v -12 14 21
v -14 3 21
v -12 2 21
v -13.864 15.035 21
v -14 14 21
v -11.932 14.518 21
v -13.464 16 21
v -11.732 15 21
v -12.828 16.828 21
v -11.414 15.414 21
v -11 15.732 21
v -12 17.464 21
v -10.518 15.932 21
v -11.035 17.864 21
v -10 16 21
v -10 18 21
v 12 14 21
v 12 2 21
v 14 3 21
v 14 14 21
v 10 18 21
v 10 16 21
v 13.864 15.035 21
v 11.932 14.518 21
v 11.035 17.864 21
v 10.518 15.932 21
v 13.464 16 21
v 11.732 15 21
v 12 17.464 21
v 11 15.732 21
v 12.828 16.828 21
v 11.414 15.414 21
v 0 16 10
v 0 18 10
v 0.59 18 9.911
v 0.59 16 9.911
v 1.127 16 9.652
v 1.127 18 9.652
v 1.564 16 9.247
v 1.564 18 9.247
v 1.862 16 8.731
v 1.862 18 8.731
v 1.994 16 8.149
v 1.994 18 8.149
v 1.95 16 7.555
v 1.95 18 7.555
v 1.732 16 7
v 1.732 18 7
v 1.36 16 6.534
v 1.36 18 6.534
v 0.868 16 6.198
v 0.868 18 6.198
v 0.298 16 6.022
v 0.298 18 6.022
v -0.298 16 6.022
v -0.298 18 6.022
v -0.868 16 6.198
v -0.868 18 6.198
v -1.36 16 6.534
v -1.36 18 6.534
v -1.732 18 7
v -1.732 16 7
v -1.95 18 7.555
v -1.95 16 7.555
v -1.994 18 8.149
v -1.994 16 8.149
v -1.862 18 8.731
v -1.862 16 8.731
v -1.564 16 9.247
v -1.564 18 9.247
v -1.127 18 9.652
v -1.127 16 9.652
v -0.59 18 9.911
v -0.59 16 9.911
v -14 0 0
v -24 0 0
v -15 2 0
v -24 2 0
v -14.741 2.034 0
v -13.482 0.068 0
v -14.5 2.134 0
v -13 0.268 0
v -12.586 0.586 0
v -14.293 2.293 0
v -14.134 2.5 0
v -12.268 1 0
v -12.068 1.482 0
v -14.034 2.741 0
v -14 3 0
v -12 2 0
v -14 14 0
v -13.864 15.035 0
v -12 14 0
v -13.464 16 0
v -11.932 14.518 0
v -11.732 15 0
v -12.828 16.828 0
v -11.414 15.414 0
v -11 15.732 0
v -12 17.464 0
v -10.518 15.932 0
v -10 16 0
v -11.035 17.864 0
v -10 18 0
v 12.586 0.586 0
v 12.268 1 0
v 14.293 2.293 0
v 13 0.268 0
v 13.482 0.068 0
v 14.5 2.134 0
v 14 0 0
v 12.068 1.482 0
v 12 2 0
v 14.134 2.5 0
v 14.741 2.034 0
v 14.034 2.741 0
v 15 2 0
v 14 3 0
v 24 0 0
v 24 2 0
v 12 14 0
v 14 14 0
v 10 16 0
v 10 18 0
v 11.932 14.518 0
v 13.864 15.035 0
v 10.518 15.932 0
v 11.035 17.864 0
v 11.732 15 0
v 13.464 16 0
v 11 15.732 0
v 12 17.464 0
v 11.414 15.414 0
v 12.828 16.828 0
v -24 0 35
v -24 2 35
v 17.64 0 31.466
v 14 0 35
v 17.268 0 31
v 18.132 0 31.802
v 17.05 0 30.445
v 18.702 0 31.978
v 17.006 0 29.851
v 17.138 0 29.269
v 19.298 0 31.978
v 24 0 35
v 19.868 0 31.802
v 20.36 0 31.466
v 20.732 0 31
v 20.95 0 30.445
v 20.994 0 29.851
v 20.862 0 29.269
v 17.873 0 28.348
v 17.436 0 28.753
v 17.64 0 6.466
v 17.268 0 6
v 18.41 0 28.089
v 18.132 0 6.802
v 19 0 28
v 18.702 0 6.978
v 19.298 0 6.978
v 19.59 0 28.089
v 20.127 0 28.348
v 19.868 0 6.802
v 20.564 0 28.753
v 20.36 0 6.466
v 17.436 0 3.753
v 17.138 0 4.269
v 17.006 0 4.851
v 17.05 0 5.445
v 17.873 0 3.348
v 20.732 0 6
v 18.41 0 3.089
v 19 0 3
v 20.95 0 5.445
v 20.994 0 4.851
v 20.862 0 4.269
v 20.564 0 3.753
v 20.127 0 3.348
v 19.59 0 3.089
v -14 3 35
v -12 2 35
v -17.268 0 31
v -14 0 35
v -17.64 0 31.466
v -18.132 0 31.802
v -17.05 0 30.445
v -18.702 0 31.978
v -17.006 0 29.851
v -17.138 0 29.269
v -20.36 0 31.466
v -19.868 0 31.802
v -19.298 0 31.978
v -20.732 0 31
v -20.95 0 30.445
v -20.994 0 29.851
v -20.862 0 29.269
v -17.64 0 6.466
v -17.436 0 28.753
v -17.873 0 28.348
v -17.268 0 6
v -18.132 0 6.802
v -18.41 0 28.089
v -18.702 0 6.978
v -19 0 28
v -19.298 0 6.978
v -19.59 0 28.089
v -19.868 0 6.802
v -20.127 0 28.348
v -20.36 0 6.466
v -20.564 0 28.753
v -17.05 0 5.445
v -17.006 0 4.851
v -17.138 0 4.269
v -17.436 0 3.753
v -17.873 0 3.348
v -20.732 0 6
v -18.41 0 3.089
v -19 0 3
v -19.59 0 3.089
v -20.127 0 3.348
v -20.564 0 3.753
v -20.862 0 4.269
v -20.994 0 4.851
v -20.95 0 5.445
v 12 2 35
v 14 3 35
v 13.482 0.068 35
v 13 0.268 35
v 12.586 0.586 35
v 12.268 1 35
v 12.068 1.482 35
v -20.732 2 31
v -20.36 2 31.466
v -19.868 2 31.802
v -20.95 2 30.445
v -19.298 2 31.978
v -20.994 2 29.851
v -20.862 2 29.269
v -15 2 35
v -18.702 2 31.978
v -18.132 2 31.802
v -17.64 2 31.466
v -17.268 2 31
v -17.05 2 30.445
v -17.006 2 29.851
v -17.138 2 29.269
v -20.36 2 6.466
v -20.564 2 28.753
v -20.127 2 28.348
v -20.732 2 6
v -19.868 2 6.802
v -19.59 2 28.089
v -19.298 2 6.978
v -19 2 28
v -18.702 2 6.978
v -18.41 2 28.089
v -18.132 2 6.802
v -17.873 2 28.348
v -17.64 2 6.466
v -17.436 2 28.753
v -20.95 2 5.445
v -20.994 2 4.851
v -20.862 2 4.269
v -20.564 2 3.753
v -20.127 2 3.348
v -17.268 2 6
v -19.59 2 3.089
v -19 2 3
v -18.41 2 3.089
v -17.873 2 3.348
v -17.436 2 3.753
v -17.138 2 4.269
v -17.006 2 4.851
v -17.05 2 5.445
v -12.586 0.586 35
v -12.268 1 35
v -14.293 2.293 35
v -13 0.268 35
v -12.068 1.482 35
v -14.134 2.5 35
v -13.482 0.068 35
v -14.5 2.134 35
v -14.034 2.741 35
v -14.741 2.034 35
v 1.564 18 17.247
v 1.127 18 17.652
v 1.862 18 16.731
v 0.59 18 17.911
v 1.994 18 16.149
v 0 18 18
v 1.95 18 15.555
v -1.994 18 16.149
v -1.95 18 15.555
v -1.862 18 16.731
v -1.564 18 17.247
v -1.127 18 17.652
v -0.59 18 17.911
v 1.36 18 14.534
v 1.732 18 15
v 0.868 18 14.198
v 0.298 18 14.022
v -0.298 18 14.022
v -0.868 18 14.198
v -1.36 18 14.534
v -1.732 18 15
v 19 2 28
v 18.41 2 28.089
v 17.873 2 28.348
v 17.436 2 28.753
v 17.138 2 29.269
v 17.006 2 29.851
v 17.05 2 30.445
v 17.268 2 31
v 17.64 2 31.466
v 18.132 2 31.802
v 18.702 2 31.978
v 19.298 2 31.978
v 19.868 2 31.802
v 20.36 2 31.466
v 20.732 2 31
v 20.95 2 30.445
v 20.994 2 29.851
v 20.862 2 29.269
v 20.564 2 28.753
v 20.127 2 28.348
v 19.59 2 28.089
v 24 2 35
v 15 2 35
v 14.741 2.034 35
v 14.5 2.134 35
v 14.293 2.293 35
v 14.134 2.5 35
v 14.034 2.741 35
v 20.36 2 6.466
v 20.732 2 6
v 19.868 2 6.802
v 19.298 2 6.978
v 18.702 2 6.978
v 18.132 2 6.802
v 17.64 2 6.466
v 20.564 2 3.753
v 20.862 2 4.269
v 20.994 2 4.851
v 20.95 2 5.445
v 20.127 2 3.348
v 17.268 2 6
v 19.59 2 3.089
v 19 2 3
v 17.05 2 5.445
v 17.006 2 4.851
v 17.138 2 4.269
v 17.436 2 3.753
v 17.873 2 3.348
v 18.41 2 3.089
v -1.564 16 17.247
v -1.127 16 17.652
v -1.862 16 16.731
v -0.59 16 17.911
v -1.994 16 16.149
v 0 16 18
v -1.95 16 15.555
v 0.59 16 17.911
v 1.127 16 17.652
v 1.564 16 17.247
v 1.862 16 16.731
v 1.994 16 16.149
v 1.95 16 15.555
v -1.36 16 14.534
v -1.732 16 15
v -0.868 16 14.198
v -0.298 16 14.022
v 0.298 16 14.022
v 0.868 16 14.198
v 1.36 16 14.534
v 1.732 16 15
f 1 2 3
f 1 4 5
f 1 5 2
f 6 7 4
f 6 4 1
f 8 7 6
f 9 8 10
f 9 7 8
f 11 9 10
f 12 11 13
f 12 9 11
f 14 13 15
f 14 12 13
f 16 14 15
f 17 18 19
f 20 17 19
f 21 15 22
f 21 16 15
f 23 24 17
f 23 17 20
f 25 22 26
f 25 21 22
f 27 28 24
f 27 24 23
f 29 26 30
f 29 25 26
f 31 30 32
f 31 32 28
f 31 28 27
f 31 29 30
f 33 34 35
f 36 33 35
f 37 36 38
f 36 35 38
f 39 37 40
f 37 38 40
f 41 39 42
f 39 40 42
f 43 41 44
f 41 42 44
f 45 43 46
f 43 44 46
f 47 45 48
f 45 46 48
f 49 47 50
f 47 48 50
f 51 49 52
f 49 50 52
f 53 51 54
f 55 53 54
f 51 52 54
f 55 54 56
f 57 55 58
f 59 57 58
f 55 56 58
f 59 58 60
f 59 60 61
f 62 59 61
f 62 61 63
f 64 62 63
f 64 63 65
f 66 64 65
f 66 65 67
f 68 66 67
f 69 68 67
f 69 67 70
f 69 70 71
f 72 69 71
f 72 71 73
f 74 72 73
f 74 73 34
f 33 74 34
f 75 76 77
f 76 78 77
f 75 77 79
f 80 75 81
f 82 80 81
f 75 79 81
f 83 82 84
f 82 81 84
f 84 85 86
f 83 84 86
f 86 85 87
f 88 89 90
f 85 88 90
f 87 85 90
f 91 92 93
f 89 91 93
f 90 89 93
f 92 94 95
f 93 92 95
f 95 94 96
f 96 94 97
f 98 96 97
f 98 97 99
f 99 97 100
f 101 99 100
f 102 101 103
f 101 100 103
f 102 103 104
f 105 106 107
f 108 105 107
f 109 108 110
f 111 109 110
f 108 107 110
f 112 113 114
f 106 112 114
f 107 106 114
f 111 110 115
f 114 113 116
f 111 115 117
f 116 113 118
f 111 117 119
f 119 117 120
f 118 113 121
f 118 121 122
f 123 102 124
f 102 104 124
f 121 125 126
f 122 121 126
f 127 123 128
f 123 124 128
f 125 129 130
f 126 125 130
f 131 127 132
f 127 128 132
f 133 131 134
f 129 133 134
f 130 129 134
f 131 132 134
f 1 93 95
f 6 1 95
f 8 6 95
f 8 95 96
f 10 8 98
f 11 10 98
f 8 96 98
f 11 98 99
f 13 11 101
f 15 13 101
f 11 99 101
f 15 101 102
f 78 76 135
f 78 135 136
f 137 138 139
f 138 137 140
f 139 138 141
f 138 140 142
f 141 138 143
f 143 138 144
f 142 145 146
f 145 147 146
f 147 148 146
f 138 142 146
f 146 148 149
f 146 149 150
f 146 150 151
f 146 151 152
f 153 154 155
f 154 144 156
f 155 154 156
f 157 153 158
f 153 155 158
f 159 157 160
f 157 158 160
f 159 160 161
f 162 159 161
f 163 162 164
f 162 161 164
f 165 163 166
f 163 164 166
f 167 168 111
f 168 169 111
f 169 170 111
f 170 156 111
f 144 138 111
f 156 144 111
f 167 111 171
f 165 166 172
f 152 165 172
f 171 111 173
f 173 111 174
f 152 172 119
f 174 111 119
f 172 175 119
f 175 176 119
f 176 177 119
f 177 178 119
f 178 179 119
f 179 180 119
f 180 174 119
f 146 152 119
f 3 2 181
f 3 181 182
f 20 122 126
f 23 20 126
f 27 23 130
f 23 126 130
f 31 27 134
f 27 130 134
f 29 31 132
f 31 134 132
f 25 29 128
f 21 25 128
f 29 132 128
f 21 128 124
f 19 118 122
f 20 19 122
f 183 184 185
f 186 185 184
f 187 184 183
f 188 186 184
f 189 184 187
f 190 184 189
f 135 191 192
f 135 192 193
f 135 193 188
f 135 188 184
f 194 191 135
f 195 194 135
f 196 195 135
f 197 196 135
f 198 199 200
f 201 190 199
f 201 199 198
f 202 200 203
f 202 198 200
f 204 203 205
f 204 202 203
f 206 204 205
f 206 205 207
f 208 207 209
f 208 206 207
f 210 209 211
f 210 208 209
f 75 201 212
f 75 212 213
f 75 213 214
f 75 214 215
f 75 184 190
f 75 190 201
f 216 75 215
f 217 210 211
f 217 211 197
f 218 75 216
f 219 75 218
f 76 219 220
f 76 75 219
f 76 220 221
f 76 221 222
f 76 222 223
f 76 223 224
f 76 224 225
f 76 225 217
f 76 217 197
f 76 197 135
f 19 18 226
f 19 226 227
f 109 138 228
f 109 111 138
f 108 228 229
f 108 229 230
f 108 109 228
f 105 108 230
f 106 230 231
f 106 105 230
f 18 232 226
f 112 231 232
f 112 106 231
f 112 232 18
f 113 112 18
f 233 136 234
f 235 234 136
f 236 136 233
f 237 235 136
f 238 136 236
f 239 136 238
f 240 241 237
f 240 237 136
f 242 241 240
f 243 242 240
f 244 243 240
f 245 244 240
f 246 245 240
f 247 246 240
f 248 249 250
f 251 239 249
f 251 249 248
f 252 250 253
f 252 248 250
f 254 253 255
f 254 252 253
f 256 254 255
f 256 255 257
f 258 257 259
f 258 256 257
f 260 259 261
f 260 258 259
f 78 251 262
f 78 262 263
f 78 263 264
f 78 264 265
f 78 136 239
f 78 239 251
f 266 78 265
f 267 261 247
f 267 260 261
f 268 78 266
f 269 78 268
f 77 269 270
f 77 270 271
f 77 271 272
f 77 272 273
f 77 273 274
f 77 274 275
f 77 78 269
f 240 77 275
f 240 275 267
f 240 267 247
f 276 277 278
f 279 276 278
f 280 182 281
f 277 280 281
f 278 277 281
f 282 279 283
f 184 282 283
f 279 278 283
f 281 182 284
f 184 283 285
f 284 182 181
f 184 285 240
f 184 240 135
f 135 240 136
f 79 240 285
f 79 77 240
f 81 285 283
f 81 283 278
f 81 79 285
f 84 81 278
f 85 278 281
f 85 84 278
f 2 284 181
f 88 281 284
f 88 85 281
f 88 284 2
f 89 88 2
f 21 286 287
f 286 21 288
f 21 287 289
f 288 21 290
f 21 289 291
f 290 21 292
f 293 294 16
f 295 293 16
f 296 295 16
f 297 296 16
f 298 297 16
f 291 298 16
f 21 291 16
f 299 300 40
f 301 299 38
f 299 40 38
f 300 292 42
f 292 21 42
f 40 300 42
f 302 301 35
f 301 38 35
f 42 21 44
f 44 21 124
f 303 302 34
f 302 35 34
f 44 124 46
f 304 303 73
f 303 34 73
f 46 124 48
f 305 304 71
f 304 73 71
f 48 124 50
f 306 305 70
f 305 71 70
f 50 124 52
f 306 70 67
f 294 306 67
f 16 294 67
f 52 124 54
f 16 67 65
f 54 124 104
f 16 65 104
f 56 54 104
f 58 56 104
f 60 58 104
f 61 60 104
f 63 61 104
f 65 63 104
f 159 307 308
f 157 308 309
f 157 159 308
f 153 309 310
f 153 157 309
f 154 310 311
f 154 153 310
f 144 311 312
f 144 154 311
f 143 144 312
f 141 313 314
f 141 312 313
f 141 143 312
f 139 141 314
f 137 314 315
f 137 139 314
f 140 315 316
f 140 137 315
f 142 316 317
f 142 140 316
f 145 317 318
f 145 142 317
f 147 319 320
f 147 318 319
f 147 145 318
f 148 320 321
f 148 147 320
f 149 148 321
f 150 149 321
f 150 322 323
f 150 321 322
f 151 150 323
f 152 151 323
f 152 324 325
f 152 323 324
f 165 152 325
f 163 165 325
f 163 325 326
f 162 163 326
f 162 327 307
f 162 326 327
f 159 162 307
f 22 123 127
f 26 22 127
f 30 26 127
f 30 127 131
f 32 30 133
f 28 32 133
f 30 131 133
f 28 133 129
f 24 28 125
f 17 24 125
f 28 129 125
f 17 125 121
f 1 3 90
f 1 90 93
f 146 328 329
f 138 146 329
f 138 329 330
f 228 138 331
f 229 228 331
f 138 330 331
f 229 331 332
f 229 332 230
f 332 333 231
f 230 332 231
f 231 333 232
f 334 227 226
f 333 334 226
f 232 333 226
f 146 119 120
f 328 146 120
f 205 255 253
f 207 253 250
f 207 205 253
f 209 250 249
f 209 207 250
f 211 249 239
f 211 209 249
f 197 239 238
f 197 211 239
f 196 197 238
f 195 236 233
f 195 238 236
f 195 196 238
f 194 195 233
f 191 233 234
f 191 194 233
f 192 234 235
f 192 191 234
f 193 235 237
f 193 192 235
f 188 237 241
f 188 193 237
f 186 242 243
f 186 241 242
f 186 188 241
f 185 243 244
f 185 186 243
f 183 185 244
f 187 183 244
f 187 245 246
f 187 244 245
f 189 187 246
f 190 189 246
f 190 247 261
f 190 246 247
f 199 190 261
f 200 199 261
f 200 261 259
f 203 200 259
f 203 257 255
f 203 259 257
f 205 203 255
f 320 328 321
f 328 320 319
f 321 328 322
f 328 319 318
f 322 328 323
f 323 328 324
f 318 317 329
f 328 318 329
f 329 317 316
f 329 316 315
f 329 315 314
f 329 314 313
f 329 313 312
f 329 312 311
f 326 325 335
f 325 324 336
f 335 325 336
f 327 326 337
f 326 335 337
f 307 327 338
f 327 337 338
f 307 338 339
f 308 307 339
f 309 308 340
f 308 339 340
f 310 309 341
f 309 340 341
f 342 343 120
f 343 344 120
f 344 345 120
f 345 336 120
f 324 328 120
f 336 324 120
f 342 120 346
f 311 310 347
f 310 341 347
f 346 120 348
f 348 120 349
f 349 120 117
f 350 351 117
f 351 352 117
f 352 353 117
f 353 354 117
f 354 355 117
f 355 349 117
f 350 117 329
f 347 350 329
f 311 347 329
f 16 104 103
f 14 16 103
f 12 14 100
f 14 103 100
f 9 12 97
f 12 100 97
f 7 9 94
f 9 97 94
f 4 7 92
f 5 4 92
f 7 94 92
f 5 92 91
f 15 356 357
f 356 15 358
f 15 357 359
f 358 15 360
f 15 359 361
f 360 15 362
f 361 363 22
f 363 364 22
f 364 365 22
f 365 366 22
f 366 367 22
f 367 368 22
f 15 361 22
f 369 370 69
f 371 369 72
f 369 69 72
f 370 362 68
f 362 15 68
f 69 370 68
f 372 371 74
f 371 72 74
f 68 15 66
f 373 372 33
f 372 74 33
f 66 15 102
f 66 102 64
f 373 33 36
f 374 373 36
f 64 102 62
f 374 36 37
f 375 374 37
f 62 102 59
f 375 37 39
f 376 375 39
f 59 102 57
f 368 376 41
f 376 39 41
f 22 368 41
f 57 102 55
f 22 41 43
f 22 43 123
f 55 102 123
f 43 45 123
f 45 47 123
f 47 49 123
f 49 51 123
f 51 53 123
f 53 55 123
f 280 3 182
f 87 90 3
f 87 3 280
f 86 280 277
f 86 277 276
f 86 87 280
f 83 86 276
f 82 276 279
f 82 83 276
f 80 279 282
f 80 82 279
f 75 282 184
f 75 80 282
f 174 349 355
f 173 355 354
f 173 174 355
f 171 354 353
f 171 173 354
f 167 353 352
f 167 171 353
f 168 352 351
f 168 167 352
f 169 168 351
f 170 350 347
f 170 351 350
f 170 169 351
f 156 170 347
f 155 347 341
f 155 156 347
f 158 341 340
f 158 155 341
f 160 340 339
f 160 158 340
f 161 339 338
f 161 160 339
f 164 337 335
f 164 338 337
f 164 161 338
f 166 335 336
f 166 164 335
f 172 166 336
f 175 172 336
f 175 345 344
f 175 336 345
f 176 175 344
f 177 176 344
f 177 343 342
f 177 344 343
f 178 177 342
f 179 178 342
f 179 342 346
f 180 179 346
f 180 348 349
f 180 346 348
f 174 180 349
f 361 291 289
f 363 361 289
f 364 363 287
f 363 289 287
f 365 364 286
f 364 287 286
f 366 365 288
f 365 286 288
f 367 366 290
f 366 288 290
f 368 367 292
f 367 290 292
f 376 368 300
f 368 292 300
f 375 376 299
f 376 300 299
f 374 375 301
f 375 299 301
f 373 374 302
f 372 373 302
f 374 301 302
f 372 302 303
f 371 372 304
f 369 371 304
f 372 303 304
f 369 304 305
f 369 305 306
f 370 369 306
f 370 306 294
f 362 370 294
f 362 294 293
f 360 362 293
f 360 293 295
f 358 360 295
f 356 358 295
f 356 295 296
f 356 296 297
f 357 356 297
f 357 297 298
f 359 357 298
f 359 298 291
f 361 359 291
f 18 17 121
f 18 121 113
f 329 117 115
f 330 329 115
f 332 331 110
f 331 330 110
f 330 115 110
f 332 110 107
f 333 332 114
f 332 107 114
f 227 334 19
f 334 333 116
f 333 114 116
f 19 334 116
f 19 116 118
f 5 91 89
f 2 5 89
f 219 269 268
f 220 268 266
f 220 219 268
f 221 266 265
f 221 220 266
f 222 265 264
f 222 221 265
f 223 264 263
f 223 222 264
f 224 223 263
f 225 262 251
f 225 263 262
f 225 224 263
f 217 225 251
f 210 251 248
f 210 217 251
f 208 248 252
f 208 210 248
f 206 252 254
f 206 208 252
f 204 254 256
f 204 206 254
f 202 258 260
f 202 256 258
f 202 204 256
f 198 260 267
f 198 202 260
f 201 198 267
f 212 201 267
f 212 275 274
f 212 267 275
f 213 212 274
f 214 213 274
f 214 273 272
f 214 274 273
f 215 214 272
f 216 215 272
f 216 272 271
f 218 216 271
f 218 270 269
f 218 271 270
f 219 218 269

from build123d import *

# Parameters (mm, degrees)
BOSS_EXTRUDE1_DEPTH = 21
BOSS_EXTRUDE2_DEPTH = 14
SKETCH6_R           = 2
CUT_EXTRUDE6_DEPTH  = 5
SKETCH7_R           = 2
CUT_EXTRUDE7_DEPTH  = 5


with BuildPart() as part:
    # Sketch2 → Boss-Extrude1 (new body)
    with BuildSketch(Plane.XY):
        with BuildLine():
            Line((-24, 0), (-14, 0))
            ThreePointArc((-14, 0), (-12.585786438, 0.585786438), (-12, 2))
            Line((-12, 2), (-12, 14))
            ThreePointArc((-12, 14), (-11.414213562, 15.414213562), (-10, 16))
            Line((-10, 16), (0, 16))
            Line((0, 16), (10, 16))
            ThreePointArc((10, 16), (11.414213562, 15.414213562), (12, 14))
            Line((12, 14), (12, 2))
            ThreePointArc((12, 2), (12.585786438, 0.585786438), (14, 0))
            Line((14, 0), (24, 0))
            Line((24, 0), (24, 2))
            Line((24, 2), (15, 2))
            ThreePointArc((15, 2), (14.292893219, 2.292893219), (14, 3))
            Line((14, 3), (14, 14))
            ThreePointArc((14, 14), (12.828427125, 16.828427125), (10, 18))
            Line((10, 18), (0, 18))
            Line((0, 18), (-10, 18))
            ThreePointArc((-10, 18), (-12.828427125, 16.828427125), (-14, 14))
            Line((-14, 14), (-14, 3))
            ThreePointArc((-14, 3), (-14.292893219, 2.292893219), (-15, 2))
            Line((-15, 2), (-24, 2))
            Line((-24, 2), (-24, 0))
        make_face()
    extrude(amount=BOSS_EXTRUDE1_DEPTH)

    # Sketch3 → Boss-Extrude2 (add)
    with BuildSketch(Plane.XY.offset(21)):
        with BuildLine():
            Line((-14, 3), (-12, 2))
            ThreePointArc((-12, 2), (-12.585786438, 0.585786438), (-14, 0))
            Line((-14, 0), (-24, 0))
            Line((-24, 0), (-24, 2))
            Line((-24, 2), (-15, 2))
            ThreePointArc((-15, 2), (-14.292893219, 2.292893219), (-14, 3))
        make_face()
        with BuildLine():
            Line((12, 2), (14, 3))
            ThreePointArc((14, 3), (14.292893219, 2.292893219), (15, 2))
            Line((15, 2), (24, 2))
            Line((24, 2), (24, 0))
            Line((24, 0), (14, 0))
            ThreePointArc((14, 0), (12.585786438, 0.585786438), (12, 2))
        make_face()
    extrude(amount=BOSS_EXTRUDE2_DEPTH)

    # Sketch6 → Cut-Extrude6 (cut)
    with BuildSketch(Plane(origin=(0, 0, 0), x_dir=(1, 0, 0), z_dir=(0, 1, 0))):
        with Locations(Location((-19, -5, 0), (0, 0, 90))):
            Circle(SKETCH6_R)
        with Locations(Location((-19, -30, 0), (0, 0, 90))):
            Circle(SKETCH6_R)
        with Locations(Location((19, -30, 0), (0, 0, 90))):
            Circle(SKETCH6_R)
        with Locations(Location((19, -5, 0), (0, 0, 90))):
            Circle(SKETCH6_R)
    extrude(amount=CUT_EXTRUDE6_DEPTH, mode=Mode.SUBTRACT)

    # Sketch7 → Cut-Extrude7 (cut)
    with BuildSketch(Plane(origin=(0, 18, 0), x_dir=(1, 0, 0), z_dir=(0, 1, 0))):
        with Locations(Location((0, -8, 0), (0, 0, 270))):
            Circle(SKETCH7_R)
        with Locations(Location((0, -16, 0), (0, 0, 270))):
            Circle(SKETCH7_R)
    extrude(amount=-CUT_EXTRUDE7_DEPTH, mode=Mode.SUBTRACT)


solid = part.part
